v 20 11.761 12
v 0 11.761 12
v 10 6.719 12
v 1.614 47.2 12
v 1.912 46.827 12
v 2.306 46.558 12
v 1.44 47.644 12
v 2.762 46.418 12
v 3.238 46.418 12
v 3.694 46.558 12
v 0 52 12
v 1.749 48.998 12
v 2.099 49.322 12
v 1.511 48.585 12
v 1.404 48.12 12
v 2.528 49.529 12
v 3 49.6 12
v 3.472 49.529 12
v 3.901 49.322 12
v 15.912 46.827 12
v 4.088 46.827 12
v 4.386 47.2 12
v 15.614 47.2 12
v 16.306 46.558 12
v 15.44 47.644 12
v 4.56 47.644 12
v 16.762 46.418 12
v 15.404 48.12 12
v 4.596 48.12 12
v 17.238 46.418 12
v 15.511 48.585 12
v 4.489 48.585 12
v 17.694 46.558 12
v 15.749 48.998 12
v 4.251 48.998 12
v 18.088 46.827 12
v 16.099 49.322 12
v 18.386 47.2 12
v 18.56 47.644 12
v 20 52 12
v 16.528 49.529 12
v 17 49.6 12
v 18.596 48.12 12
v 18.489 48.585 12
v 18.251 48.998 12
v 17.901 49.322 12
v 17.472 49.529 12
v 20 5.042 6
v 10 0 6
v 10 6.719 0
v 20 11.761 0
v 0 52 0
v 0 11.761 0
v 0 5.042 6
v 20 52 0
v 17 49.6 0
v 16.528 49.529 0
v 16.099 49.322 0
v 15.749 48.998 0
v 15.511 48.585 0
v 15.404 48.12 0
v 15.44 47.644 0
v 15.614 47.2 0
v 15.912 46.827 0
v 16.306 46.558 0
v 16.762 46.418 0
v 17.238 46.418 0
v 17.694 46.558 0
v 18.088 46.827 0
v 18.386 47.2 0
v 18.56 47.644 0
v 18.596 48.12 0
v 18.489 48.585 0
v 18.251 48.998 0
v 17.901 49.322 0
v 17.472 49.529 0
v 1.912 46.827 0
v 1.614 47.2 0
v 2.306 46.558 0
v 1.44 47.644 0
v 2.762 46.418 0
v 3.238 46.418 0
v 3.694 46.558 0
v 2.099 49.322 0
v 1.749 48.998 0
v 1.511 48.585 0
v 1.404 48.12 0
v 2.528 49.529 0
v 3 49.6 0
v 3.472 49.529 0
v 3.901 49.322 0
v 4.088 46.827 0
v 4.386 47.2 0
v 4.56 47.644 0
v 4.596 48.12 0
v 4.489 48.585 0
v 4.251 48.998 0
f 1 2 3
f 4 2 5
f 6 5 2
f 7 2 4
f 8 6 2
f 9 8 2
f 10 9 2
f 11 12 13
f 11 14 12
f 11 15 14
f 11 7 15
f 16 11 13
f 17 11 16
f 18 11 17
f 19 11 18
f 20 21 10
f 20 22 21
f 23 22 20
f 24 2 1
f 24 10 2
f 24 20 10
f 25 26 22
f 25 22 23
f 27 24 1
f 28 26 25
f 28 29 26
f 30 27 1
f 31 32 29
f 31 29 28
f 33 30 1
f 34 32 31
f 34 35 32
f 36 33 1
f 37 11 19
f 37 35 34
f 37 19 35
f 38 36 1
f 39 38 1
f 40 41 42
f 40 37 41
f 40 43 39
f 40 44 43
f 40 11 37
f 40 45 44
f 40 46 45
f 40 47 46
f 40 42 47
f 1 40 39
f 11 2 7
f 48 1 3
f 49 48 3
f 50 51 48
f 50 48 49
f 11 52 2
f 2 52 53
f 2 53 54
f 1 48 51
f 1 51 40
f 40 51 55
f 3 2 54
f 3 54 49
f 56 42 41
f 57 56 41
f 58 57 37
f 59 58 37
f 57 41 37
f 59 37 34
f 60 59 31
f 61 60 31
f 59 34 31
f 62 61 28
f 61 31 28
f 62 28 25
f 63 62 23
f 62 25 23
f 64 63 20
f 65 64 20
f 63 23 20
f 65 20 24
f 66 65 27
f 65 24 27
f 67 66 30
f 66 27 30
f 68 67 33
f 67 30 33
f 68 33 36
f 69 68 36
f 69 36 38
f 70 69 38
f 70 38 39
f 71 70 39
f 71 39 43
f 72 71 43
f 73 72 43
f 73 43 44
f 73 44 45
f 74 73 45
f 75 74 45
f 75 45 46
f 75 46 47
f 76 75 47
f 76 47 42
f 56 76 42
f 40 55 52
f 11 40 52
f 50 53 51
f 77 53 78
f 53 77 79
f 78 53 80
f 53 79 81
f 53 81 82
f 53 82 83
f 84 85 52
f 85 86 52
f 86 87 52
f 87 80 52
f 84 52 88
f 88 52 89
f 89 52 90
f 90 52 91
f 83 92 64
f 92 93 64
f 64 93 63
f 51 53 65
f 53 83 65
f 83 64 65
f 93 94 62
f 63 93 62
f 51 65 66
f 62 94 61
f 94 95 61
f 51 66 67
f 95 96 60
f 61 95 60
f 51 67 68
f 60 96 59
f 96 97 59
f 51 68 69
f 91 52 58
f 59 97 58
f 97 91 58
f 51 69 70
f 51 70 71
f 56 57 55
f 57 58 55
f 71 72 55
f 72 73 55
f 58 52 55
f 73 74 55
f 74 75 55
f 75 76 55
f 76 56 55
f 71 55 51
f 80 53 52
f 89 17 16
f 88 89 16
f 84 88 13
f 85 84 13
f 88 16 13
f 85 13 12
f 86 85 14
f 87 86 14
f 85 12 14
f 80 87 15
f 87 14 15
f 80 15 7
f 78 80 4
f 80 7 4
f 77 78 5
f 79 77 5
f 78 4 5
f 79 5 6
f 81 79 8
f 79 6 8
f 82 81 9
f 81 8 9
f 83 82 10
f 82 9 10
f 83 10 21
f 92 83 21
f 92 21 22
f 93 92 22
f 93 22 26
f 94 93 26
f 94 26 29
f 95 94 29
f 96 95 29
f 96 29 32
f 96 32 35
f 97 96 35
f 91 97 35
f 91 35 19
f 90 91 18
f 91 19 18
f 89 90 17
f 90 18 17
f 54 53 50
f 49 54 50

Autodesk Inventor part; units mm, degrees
ref_plane "YZ Plane" through (0, 0, 0) normal (1, 0, 0) x (0, 1, 0)
ref_plane "XZ Plane" through (0, 0, 0) normal (0, 1, 0) x (-1, 0, 0)
ref_plane "XY Plane" through (0, 0, 0) normal (0, 0, 1) x (1, 0, 0)
sketch "Sketch1" plane through (0, 0, 0) normal (0, 0, 1) x (1, 0, 0)
  line L0 (0, 0) -> (20, 0)
  line L1 (20, 0) -> (20, 52)
  line L2 (20, 52) -> (0, 52)
  line L3 (0, 52) -> (0, 0)
  line L4 (10, 0) -> (20, 5.0421)
  line L5 (10, 0) -> (0, 5.0421)
  point P0 (3, 48)
  point P1 (17, 48)
  dimension "d0" = 20
  dimension "d1" = 52
  dimension "d2" = 14
  dimension "d3" = 3
  dimension "d4" = 3
  dimension "d5" = 4
extrude "Extrusion1" add sketch "Sketch1" along normal blind 12 contours L5 L3 L2 L1 L4
hole "Hole1" at (3, 48, 0) at (17, 48, 0) direction (0, 0, 1) diameter 3.2 end through all
chamfer "Chamfer1" distance 6 angle 45 4 edges at (15, 2.5211, 12) (15, 2.5211, 0) (5, 2.5211, 12) (5, 2.5211, 0)
equation "\"d3\" = d4"
properties part number "hotend"
